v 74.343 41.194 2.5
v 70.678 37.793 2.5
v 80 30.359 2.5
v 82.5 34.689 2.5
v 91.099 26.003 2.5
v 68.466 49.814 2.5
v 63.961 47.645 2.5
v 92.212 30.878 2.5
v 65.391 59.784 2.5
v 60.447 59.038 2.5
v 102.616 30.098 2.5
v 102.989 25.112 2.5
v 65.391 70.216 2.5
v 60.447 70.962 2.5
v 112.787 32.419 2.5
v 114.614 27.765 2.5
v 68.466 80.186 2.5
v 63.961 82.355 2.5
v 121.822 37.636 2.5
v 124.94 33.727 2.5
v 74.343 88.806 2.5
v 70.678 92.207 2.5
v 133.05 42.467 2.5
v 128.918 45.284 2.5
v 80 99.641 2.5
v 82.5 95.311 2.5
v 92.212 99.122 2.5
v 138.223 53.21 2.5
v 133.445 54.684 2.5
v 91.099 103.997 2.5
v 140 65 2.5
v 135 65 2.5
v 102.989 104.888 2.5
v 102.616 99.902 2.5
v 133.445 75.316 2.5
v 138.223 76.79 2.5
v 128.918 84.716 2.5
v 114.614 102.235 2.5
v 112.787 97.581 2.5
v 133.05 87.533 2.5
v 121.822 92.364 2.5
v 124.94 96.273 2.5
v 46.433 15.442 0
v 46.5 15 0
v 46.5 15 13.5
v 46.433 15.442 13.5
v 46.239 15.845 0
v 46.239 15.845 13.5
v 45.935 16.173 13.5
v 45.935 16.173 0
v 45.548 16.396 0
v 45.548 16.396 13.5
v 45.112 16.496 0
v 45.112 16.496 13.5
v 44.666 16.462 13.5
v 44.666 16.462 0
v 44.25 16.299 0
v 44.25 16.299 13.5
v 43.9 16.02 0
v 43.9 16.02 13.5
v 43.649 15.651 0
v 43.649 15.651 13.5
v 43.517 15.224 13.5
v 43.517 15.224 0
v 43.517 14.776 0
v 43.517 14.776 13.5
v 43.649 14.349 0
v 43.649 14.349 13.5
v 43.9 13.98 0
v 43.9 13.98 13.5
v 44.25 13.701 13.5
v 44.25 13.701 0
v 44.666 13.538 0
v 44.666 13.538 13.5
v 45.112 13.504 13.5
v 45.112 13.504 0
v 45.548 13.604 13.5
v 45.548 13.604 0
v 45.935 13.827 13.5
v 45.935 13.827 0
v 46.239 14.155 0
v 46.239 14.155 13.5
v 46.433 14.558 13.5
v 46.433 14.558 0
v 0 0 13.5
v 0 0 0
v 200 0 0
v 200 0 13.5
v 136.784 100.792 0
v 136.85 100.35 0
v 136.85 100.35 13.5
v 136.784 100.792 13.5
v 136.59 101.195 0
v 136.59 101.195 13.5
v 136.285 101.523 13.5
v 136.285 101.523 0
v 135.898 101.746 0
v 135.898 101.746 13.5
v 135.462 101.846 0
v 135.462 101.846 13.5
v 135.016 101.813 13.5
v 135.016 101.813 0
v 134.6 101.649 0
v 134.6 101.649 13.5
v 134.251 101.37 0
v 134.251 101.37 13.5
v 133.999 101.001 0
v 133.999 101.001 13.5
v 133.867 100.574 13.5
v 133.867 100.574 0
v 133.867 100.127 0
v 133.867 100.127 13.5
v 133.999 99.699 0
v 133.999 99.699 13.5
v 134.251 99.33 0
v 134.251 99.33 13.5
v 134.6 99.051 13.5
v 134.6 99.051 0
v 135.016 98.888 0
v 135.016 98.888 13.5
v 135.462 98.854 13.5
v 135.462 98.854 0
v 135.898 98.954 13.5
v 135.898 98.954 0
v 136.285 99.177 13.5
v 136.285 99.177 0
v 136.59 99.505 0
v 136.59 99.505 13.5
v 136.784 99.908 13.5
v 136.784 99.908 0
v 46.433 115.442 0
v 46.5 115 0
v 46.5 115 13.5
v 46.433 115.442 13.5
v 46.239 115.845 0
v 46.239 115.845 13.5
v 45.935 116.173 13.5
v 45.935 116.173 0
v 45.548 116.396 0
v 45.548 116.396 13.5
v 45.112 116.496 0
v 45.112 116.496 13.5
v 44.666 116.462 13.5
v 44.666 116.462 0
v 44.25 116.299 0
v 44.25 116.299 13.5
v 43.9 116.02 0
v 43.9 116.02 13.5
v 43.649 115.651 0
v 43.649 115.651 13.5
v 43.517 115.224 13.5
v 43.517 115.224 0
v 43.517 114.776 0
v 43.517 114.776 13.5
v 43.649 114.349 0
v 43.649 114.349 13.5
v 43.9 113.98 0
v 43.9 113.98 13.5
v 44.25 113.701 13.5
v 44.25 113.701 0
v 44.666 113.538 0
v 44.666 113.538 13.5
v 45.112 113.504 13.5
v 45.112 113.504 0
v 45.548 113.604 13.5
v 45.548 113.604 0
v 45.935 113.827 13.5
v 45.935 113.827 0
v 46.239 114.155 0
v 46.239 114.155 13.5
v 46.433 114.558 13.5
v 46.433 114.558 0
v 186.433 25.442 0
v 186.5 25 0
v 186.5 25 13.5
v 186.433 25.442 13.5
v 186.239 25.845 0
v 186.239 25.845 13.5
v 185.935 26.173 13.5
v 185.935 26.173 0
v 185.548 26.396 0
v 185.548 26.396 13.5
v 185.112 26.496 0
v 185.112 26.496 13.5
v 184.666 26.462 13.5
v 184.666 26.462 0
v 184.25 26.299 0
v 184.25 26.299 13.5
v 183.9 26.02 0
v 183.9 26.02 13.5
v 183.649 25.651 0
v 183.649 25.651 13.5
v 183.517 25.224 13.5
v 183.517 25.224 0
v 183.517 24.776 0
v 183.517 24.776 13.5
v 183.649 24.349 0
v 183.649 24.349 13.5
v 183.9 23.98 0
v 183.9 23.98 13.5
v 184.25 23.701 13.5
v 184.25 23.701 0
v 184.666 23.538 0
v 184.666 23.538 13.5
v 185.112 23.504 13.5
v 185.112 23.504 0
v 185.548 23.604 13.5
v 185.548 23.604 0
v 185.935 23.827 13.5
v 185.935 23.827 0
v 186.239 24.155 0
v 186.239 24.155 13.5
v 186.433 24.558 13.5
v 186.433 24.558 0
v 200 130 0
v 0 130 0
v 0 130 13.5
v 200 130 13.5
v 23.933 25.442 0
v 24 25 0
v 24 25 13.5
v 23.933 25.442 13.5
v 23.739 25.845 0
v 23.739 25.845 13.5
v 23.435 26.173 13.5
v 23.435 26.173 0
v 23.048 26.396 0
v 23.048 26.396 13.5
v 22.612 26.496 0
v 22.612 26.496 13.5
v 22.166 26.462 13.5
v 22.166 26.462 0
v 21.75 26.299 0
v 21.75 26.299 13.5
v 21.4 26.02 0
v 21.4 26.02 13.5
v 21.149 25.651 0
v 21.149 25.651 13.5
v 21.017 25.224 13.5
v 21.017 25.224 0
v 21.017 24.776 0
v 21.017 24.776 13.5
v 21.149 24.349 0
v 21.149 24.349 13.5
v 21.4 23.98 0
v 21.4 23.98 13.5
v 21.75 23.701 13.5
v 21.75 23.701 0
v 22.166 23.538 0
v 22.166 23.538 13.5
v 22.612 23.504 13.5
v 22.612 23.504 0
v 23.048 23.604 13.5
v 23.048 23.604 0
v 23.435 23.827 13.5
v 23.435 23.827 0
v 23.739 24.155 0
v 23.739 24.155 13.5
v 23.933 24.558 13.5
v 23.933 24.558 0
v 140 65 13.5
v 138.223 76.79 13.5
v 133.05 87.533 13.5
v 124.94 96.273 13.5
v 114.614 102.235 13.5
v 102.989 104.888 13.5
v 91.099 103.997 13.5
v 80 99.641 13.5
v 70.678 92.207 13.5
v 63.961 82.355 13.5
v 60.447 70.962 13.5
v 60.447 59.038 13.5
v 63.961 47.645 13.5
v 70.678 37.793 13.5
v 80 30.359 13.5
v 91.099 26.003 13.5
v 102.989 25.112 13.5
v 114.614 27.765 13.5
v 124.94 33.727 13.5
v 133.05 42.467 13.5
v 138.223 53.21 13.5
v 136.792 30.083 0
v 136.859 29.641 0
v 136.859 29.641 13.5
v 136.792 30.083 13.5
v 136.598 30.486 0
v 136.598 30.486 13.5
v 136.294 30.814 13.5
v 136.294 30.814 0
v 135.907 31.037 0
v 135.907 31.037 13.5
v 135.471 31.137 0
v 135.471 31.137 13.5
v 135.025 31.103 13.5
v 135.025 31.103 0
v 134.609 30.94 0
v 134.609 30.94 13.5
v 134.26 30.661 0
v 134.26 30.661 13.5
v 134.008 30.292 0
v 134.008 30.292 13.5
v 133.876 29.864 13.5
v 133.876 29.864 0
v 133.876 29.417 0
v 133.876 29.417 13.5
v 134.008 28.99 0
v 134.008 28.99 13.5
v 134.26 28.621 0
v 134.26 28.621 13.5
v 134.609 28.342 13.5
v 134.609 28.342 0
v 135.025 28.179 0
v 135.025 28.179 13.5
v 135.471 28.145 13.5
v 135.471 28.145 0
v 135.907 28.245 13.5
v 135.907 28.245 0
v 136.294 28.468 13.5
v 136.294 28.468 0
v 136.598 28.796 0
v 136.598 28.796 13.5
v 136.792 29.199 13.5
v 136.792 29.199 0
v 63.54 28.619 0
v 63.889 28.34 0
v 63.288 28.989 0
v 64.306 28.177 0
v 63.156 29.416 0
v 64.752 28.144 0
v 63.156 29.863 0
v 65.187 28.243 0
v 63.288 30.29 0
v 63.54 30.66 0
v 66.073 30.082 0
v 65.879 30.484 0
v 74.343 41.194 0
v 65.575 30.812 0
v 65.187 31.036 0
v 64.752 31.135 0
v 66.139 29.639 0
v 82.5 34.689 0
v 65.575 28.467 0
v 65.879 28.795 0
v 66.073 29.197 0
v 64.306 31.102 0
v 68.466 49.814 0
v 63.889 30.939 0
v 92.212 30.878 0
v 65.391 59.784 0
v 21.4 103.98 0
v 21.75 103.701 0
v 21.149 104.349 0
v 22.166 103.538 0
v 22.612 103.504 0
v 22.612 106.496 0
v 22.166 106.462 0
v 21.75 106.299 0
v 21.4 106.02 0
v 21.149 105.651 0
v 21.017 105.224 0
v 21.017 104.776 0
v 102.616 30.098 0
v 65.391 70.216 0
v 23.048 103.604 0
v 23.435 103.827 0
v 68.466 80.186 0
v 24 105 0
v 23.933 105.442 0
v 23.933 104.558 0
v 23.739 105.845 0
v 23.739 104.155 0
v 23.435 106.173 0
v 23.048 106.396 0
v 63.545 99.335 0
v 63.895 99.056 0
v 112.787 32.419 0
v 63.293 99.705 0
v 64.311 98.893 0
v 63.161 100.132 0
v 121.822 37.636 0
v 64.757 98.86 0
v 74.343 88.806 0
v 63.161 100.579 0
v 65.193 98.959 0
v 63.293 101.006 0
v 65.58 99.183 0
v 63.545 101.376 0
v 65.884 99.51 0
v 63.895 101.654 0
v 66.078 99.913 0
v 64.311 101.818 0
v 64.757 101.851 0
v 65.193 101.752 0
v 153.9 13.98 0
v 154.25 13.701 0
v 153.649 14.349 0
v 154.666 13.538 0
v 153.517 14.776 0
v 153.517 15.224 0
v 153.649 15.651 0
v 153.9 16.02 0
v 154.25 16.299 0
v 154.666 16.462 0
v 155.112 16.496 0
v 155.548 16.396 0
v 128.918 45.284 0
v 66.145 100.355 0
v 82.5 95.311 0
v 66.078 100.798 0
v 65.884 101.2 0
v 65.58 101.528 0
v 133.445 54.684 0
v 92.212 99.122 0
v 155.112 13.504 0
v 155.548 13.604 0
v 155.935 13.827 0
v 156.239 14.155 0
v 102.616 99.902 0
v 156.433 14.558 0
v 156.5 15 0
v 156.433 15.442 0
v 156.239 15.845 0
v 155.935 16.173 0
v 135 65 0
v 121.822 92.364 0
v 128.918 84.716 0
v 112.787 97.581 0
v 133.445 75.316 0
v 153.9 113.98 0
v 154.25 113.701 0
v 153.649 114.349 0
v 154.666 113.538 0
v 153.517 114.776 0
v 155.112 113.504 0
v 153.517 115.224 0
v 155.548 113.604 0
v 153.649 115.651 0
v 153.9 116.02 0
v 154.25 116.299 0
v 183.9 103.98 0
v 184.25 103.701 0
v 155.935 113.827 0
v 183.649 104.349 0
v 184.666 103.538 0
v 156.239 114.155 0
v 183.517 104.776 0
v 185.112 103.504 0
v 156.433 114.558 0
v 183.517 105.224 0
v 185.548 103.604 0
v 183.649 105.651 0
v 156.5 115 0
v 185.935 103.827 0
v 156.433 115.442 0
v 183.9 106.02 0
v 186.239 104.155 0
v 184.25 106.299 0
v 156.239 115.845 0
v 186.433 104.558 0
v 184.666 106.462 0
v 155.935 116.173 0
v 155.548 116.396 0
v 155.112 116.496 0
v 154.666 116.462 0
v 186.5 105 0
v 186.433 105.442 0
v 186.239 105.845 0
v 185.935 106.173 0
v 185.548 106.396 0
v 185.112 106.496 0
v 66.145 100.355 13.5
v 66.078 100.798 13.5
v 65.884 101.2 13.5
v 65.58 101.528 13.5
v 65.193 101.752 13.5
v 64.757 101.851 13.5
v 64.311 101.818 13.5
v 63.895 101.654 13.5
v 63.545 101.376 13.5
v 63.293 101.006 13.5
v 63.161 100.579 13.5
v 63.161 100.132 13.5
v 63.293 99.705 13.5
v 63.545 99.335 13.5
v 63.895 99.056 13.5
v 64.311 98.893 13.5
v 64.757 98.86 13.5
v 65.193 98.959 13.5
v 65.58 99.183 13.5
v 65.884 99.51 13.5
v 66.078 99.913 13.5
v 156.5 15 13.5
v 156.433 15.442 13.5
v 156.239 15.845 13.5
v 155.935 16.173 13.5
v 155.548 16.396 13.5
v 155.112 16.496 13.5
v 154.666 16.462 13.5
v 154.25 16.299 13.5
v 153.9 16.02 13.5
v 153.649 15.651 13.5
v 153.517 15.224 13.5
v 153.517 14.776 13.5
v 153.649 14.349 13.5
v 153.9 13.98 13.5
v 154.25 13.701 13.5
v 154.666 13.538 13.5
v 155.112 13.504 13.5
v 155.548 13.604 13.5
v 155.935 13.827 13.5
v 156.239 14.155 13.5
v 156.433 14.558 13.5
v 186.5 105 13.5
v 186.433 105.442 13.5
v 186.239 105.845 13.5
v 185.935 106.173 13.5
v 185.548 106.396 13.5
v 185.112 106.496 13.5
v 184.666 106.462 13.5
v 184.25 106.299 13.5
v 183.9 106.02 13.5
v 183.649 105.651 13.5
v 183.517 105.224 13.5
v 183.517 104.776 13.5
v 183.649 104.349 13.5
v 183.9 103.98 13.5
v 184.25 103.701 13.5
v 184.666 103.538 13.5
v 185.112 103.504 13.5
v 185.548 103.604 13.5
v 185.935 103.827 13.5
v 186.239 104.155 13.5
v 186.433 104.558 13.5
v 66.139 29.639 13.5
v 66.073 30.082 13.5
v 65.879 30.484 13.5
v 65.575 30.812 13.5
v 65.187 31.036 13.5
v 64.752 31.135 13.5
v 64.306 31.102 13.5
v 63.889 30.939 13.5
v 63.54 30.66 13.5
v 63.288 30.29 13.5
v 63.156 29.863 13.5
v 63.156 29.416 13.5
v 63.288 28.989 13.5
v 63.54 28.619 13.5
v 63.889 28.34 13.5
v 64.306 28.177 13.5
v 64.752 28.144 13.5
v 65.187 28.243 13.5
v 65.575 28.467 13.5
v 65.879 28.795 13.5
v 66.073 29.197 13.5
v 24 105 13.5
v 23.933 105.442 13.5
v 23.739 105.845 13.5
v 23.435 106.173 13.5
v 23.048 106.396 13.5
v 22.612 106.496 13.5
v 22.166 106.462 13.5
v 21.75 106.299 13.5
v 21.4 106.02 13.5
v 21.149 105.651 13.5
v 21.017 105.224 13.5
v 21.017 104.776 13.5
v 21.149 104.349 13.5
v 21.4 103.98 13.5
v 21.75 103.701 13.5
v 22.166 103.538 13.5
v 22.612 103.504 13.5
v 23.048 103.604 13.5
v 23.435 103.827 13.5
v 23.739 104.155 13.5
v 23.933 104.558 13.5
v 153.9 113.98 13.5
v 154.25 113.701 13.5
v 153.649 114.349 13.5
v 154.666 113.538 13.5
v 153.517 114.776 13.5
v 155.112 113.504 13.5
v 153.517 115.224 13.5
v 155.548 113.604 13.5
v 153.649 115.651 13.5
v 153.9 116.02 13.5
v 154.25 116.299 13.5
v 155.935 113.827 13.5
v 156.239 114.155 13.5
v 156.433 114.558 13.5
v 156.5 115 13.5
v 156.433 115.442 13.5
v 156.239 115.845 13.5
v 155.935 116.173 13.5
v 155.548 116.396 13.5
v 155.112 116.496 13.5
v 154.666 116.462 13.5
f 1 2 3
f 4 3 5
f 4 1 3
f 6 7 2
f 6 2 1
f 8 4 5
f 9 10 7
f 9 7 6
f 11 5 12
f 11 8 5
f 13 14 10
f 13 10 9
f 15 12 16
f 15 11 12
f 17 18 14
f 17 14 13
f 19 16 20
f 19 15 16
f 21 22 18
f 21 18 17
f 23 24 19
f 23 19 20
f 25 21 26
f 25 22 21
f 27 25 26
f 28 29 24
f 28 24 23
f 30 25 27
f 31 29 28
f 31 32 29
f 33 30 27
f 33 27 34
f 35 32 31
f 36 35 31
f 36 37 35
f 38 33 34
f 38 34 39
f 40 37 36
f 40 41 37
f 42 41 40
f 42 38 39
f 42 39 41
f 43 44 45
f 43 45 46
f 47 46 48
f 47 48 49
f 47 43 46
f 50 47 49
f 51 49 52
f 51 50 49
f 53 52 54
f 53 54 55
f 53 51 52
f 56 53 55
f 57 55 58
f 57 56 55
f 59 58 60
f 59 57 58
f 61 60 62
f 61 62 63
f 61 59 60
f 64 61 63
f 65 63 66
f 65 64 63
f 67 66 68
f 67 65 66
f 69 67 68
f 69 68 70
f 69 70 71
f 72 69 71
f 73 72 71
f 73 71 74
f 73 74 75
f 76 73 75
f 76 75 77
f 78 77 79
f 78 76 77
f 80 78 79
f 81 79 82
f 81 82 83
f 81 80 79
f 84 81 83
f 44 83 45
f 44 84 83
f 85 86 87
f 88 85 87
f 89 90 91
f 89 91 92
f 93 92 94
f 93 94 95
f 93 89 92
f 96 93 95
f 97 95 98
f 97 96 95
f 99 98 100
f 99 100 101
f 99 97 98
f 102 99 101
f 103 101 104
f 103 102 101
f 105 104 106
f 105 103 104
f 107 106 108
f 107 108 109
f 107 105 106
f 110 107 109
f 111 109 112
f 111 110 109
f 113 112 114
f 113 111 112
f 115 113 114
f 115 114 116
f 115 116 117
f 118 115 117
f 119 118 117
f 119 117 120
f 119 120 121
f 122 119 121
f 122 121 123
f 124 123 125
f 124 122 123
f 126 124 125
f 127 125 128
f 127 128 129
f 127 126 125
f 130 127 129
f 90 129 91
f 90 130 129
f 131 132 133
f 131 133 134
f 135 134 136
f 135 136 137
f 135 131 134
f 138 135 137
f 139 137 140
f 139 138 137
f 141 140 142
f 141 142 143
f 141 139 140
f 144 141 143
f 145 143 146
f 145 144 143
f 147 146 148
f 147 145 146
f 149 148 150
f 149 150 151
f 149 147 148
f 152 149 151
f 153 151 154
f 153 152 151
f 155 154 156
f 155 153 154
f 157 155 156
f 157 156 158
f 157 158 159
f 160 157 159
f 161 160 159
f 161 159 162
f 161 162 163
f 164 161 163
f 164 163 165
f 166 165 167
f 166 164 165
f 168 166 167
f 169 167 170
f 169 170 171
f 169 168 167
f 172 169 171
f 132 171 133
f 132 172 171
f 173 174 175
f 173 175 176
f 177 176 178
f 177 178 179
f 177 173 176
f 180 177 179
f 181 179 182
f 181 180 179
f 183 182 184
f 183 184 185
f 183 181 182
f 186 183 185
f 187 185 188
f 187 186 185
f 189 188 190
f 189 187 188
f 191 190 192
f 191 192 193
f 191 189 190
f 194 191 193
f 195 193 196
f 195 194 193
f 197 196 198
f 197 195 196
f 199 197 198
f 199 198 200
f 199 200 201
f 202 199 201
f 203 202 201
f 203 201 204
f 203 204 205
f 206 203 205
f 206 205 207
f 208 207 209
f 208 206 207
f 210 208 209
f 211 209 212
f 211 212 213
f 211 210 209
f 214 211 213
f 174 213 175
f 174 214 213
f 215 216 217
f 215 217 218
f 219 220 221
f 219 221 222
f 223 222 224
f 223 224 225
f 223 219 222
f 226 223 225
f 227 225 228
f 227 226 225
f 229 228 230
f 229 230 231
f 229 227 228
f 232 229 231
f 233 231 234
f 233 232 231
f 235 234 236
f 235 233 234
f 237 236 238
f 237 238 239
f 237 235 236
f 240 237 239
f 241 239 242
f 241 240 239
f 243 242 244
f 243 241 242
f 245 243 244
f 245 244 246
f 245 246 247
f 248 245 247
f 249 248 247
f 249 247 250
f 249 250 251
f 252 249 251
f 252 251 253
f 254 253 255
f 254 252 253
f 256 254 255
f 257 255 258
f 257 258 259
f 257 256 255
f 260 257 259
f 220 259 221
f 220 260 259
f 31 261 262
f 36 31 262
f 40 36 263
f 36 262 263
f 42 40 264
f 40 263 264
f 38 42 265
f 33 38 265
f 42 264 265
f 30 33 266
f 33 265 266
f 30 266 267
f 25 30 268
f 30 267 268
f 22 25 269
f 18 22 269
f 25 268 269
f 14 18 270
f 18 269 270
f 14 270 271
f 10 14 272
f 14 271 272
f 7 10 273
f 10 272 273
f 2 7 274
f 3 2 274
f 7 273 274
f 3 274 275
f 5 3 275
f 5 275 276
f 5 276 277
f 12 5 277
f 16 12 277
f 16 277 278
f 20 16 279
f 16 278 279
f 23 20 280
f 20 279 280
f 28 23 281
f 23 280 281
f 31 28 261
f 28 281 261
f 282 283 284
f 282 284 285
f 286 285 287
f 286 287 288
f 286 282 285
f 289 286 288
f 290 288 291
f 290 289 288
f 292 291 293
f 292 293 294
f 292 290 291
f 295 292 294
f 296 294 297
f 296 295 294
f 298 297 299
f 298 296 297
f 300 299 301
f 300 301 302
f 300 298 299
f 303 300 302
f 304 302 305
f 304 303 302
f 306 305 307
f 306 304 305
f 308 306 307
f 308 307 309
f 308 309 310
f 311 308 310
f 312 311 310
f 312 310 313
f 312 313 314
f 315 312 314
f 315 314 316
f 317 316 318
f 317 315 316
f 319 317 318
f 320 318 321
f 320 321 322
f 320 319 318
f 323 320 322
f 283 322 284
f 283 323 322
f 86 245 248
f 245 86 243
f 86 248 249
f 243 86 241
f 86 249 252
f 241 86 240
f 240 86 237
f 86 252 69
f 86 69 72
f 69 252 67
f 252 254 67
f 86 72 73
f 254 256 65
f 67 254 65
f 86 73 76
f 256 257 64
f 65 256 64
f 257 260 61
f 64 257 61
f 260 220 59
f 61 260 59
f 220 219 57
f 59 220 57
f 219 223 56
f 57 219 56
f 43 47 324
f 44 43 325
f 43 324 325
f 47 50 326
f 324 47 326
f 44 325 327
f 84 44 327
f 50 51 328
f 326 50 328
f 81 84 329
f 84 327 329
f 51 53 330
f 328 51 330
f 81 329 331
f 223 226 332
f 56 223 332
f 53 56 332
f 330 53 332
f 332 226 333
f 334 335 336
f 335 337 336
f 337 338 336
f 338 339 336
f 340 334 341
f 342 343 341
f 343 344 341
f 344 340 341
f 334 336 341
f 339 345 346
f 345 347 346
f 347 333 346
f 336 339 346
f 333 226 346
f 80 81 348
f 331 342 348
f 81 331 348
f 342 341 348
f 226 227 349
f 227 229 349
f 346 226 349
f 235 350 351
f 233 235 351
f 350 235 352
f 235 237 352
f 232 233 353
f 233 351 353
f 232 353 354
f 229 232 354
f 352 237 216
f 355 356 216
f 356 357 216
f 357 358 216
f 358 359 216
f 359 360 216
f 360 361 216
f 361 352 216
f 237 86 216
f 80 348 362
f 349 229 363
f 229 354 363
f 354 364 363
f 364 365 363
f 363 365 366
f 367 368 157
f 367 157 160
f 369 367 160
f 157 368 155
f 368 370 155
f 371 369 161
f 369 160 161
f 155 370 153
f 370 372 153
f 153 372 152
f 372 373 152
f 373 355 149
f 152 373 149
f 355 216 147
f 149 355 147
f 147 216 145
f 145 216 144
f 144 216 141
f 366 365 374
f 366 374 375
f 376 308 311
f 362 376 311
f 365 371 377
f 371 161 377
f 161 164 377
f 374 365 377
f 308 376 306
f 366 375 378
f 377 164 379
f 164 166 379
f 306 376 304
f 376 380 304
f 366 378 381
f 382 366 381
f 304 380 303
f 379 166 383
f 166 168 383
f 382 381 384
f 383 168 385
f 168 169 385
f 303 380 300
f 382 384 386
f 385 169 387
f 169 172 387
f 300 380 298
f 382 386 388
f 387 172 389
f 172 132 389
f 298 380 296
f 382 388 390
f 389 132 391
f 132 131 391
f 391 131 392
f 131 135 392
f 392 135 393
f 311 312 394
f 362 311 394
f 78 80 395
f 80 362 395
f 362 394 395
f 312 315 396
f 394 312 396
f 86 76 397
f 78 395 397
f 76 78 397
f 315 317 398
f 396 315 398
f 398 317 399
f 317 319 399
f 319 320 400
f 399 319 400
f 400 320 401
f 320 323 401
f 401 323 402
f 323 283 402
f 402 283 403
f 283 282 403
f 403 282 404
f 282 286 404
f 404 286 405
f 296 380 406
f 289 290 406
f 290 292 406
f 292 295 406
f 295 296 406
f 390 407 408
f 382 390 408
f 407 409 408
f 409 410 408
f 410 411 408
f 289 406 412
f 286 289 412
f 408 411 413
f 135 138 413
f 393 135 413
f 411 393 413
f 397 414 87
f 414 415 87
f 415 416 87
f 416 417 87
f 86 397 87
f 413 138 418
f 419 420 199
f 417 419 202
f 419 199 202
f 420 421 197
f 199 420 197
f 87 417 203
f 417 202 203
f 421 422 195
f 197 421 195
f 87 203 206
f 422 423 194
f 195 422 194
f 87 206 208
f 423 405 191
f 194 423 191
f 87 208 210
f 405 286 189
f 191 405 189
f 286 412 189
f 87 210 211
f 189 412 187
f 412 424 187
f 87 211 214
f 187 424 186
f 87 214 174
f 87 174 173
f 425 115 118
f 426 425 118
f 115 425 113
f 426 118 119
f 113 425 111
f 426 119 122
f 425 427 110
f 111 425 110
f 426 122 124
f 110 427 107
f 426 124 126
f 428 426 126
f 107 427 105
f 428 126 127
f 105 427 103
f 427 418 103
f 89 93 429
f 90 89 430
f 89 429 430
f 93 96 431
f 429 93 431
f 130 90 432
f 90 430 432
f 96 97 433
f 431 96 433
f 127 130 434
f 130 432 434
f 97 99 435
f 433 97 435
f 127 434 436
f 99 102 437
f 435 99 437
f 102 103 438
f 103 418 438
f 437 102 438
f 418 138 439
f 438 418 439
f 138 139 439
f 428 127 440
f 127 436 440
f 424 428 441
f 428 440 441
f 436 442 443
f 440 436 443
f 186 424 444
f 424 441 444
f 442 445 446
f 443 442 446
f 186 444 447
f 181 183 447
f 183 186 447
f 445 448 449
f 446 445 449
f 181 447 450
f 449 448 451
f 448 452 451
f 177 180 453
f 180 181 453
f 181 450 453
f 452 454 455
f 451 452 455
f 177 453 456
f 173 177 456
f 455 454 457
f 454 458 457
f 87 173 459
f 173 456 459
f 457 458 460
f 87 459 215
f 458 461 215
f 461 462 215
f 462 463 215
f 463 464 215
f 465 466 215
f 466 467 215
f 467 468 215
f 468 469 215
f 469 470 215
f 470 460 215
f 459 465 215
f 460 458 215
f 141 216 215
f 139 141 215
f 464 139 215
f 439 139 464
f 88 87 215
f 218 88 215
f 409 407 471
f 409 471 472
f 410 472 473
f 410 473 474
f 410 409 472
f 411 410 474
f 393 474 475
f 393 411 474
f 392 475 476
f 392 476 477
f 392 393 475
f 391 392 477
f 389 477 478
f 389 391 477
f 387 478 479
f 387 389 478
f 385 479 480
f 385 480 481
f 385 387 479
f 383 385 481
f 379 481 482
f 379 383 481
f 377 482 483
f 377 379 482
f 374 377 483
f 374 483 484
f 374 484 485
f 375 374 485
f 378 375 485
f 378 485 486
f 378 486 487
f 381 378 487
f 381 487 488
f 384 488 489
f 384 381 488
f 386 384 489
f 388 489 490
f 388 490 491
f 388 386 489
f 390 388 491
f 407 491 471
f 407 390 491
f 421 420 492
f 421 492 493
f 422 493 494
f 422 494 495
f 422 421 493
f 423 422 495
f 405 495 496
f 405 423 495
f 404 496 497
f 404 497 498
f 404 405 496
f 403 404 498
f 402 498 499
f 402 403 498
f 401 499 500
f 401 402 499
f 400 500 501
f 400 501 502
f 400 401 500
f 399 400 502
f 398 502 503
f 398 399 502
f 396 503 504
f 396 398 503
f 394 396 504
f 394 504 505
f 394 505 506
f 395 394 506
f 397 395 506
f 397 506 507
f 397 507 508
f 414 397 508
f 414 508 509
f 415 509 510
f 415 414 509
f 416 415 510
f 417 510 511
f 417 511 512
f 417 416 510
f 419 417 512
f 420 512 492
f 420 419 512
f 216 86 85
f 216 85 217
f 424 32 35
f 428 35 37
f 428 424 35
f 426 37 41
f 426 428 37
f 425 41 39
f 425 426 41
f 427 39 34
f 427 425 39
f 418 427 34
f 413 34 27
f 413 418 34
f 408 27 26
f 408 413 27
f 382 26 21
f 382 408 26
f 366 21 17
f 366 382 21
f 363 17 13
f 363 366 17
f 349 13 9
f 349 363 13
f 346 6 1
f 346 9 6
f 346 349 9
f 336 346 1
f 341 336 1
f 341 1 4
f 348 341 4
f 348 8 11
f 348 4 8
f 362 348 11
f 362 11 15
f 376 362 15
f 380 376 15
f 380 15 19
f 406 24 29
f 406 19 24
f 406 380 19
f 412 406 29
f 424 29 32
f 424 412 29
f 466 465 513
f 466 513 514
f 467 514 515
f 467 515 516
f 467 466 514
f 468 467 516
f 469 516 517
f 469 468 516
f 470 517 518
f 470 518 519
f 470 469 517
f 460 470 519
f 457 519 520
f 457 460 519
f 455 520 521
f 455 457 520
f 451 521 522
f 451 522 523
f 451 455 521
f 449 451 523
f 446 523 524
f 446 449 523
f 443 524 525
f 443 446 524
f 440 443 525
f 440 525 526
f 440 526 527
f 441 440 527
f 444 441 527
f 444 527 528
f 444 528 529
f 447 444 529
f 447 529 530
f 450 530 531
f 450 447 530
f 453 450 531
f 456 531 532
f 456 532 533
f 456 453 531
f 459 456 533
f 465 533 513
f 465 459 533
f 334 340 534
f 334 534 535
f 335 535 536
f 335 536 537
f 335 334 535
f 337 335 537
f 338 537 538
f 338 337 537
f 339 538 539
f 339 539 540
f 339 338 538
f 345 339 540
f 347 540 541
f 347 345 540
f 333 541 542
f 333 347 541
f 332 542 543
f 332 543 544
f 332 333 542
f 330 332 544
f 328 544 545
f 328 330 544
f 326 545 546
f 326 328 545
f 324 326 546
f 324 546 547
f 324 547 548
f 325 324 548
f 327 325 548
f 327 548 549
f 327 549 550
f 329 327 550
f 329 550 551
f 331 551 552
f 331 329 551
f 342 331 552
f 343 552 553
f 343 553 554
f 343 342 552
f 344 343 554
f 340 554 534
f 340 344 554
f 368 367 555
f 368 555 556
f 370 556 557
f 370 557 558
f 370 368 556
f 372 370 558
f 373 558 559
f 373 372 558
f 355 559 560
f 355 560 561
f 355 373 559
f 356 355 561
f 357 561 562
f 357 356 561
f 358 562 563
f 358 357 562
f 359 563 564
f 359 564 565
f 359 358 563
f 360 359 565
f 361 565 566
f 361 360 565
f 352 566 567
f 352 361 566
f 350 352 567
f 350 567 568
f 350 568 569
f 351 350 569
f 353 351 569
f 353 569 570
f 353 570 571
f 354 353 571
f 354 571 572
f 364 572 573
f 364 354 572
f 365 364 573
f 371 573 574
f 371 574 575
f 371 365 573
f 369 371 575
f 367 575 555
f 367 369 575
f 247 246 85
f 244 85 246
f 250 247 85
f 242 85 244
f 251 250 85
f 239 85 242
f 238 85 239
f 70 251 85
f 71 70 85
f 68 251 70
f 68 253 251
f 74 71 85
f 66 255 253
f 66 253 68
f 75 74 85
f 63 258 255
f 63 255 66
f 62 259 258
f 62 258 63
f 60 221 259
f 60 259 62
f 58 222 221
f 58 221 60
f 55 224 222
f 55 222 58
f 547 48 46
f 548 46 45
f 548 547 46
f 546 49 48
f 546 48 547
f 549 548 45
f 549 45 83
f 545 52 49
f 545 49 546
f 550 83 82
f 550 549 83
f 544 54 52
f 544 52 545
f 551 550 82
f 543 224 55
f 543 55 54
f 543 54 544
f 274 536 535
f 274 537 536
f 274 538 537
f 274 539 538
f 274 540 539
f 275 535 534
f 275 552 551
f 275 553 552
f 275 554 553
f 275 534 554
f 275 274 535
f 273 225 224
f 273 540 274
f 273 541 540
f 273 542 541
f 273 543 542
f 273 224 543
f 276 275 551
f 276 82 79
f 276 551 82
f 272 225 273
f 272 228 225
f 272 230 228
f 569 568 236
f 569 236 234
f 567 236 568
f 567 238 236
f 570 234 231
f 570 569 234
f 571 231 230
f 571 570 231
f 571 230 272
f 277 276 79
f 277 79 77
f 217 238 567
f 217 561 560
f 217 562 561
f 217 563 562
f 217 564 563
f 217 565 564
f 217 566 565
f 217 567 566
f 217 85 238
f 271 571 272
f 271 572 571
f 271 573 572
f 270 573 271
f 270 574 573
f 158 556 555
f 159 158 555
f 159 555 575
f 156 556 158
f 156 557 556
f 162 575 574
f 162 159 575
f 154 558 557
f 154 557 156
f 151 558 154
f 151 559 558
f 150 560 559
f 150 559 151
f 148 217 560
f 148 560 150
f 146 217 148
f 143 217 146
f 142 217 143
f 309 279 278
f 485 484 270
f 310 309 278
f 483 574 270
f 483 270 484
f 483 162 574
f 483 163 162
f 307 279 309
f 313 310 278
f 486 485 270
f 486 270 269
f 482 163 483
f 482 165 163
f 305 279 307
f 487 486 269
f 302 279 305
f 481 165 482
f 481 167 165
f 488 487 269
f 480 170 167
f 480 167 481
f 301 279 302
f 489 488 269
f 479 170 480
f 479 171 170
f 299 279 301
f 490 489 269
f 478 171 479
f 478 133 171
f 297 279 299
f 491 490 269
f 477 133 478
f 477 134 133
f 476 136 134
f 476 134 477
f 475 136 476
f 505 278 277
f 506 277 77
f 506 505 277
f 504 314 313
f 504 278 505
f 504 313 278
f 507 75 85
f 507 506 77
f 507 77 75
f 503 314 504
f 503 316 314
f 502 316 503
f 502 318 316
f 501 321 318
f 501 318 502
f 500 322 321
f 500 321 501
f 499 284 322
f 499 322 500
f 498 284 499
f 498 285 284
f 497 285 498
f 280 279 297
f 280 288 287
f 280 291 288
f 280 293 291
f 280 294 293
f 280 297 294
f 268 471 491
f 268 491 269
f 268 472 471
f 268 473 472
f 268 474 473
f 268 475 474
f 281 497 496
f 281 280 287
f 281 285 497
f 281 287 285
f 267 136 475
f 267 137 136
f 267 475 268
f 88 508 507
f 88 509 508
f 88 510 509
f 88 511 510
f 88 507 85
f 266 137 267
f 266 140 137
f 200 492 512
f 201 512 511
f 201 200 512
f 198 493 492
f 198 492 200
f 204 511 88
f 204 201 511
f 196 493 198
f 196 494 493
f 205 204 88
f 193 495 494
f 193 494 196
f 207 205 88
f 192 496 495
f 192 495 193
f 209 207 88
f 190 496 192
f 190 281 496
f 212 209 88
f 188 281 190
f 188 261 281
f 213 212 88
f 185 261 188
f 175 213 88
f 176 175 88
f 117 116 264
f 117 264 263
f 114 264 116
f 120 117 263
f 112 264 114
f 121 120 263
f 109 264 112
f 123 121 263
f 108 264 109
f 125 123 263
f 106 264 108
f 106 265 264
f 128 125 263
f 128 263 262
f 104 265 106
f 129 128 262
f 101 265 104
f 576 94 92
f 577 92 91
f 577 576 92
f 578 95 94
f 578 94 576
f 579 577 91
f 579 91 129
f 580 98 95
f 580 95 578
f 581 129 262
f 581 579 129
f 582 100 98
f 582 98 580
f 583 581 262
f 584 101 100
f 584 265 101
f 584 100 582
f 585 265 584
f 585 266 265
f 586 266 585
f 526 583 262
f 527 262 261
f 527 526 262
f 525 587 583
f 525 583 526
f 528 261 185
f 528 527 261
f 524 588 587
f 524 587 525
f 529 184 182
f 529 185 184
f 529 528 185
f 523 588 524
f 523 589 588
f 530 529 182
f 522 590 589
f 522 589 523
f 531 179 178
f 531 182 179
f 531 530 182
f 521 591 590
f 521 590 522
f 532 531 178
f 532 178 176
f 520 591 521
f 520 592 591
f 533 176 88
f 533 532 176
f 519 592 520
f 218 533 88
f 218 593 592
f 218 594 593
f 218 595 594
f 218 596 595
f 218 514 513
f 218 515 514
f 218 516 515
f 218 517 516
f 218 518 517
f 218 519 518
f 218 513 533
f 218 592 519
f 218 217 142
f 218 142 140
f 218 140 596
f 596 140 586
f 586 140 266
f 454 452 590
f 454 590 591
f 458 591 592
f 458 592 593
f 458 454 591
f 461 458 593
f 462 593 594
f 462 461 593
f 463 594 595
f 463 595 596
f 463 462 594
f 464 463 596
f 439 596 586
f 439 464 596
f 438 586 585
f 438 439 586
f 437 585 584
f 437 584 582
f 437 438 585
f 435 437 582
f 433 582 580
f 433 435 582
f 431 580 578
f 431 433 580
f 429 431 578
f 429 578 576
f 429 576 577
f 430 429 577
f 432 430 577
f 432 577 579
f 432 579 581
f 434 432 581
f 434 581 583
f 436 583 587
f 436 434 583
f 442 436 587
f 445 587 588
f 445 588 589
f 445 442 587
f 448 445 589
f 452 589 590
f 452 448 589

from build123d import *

# Parameters (mm, degrees)
SKETCH_W     = 200
SKETCH_H     = 130
SKETCH_R     = 35
SKETCH_R_2   = 1.5
PAD_DEPTH    = 13.5
SKETCH001_R  = 40
POCKET_DEPTH = 11


with BuildPart() as part:
    # Sketch → Pad (new body)
    with BuildSketch(Plane.XY):
        with Locations((100, 65)):
            Rectangle(SKETCH_W, SKETCH_H)
        with Locations((100, 65)):
            Circle(SKETCH_R, mode=Mode.SUBTRACT)
        with Locations((45, 115)):
            Circle(SKETCH_R_2, mode=Mode.SUBTRACT)
        with Locations((45, 15)):
            Circle(SKETCH_R_2, mode=Mode.SUBTRACT)
        with Locations((155, 115)):
            Circle(SKETCH_R_2, mode=Mode.SUBTRACT)
        with Locations((155, 15)):
            Circle(SKETCH_R_2, mode=Mode.SUBTRACT)
        with Locations((22.5, 105)):
            Circle(SKETCH_R_2, mode=Mode.SUBTRACT)
        with Locations((22.5, 25)):
            Circle(SKETCH_R_2, mode=Mode.SUBTRACT)
        with Locations((185, 105)):
            Circle(SKETCH_R_2, mode=Mode.SUBTRACT)
        with Locations((185, 25)):
            Circle(SKETCH_R_2, mode=Mode.SUBTRACT)
        with Locations((135.350164, 100.350164)):
            Circle(SKETCH_R_2, mode=Mode.SUBTRACT)
        with Locations((64.639486, 29.639486)):
            Circle(SKETCH_R_2, mode=Mode.SUBTRACT)
        with Locations((64.64463, 100.35537)):
            Circle(SKETCH_R_2, mode=Mode.SUBTRACT)
        with Locations((135.359088, 29.640912)):
            Circle(SKETCH_R_2, mode=Mode.SUBTRACT)
    extrude(amount=PAD_DEPTH)

    # Sketch001 (on Face19 of Pad) → Pocket (cut)
    with BuildSketch(Plane.XY.offset(13.5)):
        with Locations((100, 65)):
            Circle(SKETCH001_R)
    extrude(amount=-POCKET_DEPTH, mode=Mode.SUBTRACT)


solid = part.part
